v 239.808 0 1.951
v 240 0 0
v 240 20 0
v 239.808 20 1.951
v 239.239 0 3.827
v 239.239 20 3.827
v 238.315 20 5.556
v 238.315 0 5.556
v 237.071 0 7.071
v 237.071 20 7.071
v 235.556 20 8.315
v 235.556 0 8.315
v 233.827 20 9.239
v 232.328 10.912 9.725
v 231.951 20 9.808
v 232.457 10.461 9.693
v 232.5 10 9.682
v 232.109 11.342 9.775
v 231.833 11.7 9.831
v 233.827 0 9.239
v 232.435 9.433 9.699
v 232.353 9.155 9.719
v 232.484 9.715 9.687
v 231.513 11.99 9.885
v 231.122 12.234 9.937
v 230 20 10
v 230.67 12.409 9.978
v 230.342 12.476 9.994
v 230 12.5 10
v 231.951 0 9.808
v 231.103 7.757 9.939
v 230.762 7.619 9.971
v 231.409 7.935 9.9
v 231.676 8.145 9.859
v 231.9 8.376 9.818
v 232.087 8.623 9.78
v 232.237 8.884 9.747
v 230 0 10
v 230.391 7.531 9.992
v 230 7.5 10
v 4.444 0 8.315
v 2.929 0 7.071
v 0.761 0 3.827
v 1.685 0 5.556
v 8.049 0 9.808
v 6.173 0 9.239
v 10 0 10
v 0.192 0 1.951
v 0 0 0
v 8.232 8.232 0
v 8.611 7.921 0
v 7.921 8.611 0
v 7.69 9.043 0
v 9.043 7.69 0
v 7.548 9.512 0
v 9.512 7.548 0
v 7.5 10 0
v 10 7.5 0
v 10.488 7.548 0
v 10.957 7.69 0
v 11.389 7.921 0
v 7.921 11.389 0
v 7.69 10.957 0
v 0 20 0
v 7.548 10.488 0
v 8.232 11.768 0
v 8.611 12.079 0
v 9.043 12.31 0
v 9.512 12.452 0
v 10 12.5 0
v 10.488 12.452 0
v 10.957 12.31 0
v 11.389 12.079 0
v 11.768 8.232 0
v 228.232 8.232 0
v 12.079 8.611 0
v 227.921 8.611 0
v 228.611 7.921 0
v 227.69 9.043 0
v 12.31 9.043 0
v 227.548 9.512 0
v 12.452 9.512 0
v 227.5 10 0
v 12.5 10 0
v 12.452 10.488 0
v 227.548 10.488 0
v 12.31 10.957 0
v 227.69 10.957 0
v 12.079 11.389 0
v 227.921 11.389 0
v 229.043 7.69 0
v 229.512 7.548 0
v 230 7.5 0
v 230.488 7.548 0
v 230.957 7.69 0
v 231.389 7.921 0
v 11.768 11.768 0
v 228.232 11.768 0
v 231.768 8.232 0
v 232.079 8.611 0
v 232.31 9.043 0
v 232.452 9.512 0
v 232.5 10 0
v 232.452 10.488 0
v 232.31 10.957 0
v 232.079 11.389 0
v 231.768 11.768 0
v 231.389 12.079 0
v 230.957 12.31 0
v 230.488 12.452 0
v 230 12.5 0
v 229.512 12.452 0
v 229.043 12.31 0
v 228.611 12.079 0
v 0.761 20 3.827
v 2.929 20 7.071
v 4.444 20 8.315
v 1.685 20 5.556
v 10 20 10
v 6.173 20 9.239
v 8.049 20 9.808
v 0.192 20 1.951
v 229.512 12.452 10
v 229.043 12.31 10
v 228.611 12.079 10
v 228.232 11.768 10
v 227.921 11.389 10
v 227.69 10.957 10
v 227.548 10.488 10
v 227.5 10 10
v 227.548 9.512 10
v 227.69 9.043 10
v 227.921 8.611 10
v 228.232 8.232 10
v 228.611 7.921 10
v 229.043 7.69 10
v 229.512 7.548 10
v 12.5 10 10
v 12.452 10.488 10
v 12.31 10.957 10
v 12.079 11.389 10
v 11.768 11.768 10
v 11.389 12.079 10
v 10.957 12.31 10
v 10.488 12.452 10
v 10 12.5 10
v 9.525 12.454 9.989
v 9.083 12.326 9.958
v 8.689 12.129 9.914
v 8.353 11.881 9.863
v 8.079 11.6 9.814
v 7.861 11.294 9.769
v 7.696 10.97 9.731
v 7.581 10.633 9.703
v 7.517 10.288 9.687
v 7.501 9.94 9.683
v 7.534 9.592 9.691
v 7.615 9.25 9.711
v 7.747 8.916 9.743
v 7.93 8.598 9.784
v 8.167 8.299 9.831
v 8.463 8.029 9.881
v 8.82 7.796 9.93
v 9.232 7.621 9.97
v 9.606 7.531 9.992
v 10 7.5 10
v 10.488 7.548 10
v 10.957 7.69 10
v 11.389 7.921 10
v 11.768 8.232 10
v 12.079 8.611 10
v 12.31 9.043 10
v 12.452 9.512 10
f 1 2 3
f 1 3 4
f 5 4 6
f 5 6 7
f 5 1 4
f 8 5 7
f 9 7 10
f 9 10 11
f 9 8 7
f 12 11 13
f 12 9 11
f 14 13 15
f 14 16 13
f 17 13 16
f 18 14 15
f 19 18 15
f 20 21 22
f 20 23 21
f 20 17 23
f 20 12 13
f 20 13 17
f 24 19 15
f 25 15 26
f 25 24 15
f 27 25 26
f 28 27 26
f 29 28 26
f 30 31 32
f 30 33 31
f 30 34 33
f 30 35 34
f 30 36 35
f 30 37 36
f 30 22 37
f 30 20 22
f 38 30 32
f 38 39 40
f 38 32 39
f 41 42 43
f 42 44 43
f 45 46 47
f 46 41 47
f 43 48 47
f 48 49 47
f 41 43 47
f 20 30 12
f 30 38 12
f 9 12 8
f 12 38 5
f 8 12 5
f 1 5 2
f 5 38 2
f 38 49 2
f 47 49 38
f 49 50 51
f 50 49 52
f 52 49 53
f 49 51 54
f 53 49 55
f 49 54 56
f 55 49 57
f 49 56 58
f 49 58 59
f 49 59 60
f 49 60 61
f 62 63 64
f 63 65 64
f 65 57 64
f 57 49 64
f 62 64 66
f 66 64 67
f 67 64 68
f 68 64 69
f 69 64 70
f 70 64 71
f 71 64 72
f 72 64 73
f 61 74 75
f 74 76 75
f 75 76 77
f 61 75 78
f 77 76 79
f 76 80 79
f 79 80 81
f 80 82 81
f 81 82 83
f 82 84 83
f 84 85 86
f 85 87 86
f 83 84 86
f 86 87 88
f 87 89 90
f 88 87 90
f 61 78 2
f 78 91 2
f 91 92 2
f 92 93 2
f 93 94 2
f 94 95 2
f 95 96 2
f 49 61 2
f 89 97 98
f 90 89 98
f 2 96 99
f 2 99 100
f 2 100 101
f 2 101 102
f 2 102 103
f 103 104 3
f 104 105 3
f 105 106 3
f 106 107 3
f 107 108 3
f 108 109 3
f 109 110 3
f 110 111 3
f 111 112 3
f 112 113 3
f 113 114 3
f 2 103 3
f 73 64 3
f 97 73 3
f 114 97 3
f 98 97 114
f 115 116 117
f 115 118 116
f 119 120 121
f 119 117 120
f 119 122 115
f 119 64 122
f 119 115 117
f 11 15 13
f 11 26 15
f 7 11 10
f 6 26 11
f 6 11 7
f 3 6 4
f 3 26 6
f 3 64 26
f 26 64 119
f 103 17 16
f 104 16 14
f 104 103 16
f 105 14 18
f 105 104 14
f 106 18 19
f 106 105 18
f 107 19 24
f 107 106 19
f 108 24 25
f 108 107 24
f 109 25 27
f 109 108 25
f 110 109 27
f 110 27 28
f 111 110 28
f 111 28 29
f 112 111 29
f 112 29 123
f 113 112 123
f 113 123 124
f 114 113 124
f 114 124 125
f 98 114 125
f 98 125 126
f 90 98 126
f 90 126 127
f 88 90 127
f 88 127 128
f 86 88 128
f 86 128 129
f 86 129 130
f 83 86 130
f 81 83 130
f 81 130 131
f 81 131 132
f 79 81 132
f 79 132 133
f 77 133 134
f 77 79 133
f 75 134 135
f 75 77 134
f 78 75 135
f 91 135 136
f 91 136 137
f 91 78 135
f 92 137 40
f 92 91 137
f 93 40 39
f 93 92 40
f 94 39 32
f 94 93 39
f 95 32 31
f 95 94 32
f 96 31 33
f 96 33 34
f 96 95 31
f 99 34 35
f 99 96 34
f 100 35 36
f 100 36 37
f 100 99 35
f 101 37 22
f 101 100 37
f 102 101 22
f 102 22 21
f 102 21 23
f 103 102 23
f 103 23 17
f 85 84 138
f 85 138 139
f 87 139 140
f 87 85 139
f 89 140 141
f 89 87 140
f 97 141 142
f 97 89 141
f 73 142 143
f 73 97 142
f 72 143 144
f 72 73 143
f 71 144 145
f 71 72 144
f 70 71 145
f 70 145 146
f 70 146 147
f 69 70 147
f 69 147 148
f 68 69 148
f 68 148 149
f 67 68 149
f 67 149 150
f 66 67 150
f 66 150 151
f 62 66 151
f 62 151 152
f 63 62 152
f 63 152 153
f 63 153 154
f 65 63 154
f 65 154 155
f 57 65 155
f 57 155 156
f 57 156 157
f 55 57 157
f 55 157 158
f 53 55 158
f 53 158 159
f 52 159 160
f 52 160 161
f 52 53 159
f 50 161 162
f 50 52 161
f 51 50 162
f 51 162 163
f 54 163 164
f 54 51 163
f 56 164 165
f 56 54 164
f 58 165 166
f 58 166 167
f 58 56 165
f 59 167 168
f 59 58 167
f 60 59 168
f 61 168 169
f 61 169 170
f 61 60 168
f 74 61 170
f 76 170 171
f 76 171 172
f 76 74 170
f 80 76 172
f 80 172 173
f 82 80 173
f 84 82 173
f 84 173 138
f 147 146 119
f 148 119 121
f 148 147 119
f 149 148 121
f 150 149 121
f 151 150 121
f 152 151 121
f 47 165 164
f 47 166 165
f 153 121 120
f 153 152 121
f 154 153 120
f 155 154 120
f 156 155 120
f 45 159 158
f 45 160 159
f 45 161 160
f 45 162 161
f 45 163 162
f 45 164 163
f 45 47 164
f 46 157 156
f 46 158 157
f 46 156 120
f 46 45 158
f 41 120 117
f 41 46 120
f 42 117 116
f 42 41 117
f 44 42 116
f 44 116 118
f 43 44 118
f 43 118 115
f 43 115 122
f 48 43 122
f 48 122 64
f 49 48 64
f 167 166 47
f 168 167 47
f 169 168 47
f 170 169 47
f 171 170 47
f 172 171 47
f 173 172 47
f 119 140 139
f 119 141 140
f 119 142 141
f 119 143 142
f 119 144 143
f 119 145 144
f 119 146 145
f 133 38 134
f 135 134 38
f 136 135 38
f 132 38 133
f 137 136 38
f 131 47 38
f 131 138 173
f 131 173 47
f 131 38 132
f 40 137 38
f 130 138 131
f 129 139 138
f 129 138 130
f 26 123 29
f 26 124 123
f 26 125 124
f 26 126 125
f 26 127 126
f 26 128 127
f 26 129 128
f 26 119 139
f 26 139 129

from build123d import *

# Parameters (mm, degrees)
SKETCH1_W           = 240
SKETCH1_H           = 20
SKETCH1_R           = 2.5
BOSS_EXTRUDE1_DEPTH = 10
FILLET1_START       = -1
FILLET1_DEPTH       = 22


with BuildPart() as part:
    # Sketch1 → Boss-Extrude1 (new body)
    with BuildSketch(Plane.XY):
        with Locations((120, 10)):
            Rectangle(SKETCH1_W, SKETCH1_H)
        with Locations((230, 10)):
            Circle(SKETCH1_R, mode=Mode.SUBTRACT)
        with Locations((10, 10)):
            Circle(SKETCH1_R, mode=Mode.SUBTRACT)
    extrude(amount=BOSS_EXTRUDE1_DEPTH)

    # Fillet1: read off the stored shape, not the designer's step
    # Fillet1 outline → Fillet1 (cut)
    with BuildSketch(Plane(origin=(0, 0, 0), x_dir=(1, 0, 0), z_dir=(0, 1, 0)).offset(FILLET1_START)):
        with BuildLine():
            Line((0, -10), (10, -10))
            ThreePointArc((10, -10), (2.928932188, -7.071067812), (0, 0))
            Line((0, 0), (0, -10))
        make_face()
        with BuildLine():
            ThreePointArc((240, 0), (237.071067812, -7.071067812), (230, -10))
            Line((230, -10), (240, -10))
            Line((240, -10), (240, 0))
        make_face()
    extrude(amount=FILLET1_DEPTH, mode=Mode.SUBTRACT)


solid = part.part
